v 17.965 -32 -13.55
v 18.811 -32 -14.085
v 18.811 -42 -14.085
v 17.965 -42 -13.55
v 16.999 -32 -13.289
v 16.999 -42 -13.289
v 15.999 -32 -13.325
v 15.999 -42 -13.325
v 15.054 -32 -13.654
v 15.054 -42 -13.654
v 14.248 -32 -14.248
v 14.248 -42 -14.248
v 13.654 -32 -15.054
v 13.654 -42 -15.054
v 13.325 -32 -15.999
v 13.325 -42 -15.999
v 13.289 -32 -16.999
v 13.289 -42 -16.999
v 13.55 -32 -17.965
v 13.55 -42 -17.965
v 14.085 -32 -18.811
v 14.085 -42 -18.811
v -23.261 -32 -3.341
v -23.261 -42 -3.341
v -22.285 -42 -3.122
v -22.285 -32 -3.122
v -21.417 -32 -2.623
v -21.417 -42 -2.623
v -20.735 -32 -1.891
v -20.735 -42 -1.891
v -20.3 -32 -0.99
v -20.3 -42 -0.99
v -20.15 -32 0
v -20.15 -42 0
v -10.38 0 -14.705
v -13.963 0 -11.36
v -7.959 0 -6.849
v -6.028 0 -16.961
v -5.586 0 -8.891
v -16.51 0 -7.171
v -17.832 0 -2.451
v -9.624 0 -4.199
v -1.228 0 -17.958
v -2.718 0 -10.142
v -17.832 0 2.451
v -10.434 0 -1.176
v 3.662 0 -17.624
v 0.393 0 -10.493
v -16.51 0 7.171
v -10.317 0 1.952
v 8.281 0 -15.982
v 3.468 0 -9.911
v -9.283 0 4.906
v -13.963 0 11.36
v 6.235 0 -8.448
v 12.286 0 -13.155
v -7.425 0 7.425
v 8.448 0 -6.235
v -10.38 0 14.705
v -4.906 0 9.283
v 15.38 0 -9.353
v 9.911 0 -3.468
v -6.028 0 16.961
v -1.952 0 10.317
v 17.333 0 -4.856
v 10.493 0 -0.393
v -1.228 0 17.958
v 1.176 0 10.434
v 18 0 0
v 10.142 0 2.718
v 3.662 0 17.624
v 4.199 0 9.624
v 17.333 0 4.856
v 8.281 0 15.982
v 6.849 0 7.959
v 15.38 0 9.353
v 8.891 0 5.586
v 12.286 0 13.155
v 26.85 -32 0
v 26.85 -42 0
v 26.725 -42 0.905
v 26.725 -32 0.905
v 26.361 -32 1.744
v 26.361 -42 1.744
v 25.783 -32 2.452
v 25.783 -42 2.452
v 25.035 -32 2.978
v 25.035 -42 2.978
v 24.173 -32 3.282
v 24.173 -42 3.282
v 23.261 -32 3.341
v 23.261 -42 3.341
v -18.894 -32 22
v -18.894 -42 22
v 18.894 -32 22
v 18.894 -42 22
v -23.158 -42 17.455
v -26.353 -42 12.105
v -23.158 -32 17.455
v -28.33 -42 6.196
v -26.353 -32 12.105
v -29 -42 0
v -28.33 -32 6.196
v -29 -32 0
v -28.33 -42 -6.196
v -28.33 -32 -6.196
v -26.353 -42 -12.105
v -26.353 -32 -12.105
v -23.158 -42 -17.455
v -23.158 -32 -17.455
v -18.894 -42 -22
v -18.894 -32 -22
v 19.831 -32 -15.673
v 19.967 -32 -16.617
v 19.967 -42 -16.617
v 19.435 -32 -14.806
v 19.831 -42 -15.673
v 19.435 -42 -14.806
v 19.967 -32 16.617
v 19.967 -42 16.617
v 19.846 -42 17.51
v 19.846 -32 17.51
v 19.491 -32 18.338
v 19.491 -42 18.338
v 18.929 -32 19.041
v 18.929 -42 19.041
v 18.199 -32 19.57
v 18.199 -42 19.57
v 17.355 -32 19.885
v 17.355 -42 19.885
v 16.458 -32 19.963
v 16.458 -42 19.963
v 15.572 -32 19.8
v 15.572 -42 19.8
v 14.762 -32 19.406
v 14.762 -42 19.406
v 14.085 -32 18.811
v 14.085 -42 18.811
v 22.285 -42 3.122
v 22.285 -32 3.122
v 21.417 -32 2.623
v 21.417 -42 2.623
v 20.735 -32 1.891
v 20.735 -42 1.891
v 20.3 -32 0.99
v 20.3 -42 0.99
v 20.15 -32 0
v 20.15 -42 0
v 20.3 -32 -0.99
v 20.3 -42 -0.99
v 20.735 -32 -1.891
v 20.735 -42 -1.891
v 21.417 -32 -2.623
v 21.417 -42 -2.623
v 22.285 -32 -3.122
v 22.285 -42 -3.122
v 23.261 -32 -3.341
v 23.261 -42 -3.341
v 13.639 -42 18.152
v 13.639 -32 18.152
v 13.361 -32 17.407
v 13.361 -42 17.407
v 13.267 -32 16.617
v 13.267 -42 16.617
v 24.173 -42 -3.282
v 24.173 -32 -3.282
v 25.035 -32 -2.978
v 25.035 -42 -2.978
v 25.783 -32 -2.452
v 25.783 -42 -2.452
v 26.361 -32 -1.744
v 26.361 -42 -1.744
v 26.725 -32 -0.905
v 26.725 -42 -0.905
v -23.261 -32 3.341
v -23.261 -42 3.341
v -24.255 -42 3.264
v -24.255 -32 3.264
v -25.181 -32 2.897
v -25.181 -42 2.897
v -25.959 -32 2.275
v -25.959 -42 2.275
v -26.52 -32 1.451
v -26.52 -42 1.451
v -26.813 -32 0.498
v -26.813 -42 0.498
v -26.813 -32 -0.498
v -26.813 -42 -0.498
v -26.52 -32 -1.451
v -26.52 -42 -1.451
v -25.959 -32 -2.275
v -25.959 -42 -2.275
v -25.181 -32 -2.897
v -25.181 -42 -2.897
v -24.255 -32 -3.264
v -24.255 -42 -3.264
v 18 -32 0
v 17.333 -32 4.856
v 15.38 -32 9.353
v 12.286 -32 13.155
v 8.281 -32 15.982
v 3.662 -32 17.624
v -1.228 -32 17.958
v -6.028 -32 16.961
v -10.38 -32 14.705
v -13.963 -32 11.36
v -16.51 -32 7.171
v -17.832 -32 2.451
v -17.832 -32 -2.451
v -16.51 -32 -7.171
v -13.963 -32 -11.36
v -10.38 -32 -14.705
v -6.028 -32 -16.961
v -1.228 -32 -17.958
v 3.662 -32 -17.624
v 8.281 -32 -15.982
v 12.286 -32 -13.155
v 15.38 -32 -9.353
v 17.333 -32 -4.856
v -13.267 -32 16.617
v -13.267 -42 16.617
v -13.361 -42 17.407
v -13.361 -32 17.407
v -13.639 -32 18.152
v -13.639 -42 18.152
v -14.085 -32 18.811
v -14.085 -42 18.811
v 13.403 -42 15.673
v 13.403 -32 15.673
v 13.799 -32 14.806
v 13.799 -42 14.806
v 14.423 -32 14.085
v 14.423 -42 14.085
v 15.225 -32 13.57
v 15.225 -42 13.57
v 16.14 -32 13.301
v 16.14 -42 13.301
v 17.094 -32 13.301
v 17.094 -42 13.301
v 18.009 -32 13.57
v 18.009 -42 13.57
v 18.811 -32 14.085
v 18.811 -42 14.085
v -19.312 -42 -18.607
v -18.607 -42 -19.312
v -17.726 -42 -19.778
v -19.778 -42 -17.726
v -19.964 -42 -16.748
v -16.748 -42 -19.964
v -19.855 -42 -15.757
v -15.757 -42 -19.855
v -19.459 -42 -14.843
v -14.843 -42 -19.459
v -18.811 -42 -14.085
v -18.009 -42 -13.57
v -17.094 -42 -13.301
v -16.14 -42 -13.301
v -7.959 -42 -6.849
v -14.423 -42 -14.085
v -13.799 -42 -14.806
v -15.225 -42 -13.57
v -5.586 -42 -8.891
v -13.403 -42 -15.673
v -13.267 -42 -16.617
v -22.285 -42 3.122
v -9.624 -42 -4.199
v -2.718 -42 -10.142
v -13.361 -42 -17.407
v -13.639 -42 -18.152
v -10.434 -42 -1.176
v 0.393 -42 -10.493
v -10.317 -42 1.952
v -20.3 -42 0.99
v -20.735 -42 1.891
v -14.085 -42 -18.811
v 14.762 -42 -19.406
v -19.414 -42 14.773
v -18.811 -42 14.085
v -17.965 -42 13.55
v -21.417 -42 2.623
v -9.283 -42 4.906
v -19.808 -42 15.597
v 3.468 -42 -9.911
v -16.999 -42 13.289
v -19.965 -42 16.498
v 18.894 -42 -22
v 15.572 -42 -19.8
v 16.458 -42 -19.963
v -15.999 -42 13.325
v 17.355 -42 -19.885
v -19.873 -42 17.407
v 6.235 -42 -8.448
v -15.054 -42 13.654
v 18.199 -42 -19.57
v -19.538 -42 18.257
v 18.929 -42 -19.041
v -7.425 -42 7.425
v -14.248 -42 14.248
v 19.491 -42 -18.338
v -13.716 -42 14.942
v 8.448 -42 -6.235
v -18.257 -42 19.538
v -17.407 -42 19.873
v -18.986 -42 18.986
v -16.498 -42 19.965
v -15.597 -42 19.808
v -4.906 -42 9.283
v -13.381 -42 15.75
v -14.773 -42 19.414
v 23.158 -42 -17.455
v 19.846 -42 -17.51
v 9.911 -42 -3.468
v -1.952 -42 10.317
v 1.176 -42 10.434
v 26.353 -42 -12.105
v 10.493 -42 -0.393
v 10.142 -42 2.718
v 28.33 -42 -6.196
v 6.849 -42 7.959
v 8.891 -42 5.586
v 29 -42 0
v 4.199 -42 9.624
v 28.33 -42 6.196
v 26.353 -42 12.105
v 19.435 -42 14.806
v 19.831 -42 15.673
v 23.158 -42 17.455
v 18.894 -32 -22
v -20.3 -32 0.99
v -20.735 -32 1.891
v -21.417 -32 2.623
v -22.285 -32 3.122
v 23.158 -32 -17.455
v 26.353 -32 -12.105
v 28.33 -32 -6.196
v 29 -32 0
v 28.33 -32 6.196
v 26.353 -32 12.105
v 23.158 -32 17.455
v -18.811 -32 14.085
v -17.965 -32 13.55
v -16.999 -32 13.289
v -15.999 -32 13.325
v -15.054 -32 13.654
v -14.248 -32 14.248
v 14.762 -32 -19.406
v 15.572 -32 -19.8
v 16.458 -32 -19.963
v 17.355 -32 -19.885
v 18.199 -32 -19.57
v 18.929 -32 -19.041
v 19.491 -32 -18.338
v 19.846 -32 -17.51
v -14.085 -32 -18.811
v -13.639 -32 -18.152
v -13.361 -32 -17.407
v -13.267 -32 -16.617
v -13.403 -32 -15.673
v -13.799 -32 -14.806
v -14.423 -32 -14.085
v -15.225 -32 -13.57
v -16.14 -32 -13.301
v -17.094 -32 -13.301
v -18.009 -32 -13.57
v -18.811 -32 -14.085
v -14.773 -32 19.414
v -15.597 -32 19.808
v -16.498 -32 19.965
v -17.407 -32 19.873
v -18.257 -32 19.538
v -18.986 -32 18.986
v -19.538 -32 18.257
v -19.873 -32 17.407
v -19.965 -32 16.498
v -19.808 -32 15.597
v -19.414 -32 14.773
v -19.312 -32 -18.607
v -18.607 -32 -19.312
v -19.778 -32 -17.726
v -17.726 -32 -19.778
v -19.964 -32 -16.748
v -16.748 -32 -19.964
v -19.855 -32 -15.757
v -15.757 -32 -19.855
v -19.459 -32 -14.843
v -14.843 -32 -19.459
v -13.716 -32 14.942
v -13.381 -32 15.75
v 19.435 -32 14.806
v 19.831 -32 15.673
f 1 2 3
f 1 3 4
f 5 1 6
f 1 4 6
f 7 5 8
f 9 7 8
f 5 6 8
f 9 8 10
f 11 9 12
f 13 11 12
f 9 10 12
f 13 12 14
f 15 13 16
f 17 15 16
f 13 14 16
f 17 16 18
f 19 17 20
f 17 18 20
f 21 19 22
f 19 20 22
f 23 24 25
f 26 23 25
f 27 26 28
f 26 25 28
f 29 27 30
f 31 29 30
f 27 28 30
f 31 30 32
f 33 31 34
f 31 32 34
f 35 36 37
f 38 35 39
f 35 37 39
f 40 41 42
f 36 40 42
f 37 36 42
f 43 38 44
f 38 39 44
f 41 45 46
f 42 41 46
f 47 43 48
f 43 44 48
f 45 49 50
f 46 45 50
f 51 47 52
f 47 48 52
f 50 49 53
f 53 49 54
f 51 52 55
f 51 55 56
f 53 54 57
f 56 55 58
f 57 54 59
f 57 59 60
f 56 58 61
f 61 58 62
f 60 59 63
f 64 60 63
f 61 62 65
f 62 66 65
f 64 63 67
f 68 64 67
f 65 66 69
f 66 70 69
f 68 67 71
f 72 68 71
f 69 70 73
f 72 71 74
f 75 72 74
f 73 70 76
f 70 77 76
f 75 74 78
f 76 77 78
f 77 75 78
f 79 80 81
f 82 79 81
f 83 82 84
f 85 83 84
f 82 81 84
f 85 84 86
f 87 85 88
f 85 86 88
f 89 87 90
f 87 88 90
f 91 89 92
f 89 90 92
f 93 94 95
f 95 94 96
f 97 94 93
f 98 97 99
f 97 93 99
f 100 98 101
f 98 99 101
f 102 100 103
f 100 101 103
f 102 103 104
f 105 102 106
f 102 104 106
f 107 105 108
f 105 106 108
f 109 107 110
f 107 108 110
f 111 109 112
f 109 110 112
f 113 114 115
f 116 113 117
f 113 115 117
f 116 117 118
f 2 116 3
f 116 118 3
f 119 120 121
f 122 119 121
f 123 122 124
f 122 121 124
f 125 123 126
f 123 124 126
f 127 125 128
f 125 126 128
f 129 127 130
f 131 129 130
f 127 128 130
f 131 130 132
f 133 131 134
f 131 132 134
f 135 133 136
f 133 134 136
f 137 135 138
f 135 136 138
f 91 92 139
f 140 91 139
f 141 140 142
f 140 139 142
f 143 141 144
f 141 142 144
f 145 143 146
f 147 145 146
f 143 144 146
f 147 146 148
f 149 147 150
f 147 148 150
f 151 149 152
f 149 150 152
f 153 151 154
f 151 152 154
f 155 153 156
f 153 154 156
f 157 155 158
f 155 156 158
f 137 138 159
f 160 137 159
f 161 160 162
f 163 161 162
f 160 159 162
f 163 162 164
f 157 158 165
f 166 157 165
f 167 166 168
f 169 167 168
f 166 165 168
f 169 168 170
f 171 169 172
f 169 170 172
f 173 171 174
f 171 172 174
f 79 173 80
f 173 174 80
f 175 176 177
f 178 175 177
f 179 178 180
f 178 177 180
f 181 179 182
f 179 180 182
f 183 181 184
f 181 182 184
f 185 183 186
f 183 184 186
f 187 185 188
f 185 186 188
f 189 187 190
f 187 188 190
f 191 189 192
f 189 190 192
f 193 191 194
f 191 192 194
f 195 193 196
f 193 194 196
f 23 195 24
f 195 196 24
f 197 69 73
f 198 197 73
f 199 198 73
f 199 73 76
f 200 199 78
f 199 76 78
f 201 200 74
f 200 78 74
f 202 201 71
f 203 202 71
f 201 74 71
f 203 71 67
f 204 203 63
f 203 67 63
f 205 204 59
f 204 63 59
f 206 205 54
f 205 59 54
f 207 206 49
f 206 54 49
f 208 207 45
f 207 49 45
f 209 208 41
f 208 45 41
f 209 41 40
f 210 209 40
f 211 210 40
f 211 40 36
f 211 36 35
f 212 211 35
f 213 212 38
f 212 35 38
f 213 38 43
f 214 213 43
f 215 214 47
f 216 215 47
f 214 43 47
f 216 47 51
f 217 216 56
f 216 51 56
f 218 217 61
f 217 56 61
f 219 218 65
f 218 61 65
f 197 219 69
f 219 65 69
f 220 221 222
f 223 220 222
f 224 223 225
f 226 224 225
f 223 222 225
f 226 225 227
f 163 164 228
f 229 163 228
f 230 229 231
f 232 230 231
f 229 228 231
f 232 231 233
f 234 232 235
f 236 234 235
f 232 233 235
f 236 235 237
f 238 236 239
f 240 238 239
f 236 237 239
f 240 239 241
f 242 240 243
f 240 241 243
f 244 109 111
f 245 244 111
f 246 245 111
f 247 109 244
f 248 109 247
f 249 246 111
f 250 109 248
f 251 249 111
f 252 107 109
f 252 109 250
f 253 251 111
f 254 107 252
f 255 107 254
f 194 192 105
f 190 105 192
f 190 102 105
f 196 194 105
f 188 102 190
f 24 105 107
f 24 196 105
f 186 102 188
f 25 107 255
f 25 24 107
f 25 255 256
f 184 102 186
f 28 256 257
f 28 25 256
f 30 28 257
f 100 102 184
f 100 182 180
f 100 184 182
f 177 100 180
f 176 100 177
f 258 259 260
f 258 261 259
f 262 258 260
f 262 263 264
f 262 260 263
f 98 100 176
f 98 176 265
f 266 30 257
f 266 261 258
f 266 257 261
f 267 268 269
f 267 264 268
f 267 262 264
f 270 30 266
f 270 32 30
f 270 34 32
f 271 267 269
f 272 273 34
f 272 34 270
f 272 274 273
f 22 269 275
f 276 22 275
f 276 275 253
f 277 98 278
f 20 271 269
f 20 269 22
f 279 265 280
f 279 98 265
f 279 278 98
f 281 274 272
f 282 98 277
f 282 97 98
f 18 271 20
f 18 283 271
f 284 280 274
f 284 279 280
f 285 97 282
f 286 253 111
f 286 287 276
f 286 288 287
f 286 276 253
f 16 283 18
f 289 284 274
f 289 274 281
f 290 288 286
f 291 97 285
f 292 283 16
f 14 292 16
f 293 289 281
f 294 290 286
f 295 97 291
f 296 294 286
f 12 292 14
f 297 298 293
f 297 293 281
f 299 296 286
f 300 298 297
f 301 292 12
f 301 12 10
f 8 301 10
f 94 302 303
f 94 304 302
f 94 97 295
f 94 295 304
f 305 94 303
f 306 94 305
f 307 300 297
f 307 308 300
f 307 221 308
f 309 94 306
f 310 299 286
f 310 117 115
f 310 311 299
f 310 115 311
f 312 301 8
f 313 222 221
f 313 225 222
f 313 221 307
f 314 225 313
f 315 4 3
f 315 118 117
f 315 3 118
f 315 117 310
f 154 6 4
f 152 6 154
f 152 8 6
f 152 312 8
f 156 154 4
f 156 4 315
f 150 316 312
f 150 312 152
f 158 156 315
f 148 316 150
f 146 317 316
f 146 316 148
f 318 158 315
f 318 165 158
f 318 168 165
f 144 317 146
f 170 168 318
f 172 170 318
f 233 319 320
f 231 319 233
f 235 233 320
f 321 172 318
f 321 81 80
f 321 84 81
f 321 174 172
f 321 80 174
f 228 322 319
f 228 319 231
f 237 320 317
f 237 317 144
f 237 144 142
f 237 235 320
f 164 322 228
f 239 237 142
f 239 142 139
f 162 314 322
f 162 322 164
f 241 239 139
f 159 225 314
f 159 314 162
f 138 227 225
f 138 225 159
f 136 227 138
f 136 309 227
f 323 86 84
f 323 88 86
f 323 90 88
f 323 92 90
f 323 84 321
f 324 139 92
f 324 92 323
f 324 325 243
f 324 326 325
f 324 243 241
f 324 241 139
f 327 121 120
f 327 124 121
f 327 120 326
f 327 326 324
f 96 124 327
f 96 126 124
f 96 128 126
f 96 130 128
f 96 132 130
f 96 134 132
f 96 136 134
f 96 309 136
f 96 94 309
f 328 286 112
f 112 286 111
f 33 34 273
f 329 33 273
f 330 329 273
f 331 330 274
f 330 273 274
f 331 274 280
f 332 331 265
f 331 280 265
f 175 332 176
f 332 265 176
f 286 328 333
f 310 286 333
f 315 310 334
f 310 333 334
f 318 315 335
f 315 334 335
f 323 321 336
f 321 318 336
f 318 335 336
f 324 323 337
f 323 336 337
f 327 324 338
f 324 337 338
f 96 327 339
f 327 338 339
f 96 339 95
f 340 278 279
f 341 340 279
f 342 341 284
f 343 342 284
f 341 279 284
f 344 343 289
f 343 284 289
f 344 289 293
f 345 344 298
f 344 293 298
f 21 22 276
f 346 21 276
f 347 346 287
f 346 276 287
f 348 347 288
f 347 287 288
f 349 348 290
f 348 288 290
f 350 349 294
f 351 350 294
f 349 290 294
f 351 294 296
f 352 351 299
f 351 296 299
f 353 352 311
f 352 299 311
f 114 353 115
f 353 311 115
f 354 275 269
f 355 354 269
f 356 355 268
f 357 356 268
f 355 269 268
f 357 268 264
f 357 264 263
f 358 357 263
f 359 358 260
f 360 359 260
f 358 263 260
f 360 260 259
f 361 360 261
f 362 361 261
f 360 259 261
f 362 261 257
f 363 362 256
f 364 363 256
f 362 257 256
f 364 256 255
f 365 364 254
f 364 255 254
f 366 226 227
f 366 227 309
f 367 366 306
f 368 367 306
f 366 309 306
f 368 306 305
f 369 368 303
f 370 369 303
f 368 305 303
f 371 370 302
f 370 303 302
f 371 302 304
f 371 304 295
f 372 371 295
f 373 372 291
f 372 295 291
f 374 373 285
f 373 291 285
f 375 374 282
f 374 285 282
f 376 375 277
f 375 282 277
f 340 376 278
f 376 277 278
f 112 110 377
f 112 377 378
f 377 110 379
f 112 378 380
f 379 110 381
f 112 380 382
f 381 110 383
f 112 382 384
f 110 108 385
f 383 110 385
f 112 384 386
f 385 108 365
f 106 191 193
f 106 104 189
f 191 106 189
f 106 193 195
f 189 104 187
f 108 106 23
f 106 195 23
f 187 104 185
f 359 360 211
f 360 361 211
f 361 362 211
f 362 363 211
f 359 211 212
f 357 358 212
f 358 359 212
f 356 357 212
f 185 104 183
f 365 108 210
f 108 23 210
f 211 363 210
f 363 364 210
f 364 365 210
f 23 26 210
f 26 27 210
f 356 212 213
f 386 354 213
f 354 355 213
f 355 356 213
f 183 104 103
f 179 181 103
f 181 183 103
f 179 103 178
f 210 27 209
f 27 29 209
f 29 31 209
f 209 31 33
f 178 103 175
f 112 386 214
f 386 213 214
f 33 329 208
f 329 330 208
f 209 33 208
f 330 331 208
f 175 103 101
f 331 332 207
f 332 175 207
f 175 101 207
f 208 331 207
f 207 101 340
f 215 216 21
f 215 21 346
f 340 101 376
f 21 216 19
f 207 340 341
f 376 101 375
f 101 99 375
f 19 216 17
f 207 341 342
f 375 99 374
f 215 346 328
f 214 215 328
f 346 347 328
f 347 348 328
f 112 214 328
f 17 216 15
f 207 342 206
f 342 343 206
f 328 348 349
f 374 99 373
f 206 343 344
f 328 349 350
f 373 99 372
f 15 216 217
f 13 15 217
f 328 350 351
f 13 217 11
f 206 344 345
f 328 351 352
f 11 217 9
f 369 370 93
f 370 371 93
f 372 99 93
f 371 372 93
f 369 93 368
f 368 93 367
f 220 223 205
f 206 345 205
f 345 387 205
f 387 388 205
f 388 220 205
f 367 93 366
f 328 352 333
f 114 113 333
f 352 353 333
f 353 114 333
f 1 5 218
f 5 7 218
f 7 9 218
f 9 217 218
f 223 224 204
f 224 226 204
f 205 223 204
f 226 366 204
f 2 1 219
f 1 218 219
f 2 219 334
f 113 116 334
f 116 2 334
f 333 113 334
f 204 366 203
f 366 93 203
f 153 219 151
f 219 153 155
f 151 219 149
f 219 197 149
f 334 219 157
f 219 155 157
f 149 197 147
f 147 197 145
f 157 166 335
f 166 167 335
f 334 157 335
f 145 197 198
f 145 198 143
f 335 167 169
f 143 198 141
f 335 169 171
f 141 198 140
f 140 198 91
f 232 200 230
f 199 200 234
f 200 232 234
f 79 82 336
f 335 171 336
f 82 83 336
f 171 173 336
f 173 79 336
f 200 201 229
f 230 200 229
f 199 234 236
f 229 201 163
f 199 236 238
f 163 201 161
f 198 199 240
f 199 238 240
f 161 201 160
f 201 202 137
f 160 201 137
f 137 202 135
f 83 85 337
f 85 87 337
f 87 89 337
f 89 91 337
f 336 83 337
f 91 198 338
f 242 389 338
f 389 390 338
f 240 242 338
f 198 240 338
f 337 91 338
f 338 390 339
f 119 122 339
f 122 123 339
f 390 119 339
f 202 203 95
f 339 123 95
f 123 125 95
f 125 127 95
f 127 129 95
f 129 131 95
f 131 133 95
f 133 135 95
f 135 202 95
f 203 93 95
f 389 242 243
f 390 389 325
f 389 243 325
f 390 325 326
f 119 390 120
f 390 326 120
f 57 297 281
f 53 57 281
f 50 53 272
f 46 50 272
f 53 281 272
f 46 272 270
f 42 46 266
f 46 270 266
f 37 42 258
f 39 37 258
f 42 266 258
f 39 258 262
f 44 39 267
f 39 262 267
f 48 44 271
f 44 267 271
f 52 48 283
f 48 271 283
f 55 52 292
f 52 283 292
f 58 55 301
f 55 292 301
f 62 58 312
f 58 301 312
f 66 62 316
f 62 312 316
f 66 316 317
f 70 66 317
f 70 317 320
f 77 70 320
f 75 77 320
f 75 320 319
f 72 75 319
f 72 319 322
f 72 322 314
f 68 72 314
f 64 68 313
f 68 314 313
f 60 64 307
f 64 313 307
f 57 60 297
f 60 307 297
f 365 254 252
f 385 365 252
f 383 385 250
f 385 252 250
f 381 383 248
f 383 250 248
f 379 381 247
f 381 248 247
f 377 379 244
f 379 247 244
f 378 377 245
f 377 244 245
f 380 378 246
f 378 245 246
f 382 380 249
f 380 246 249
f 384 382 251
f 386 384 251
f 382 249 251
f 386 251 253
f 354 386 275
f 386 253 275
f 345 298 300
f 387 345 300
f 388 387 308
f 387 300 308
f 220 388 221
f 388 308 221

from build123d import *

# Parameters (mm, degrees)
F0_R     = 18
F1_DEPTH = 32
F2_R     = 29
F3_DEPTH = 10
F5_DEPTH = 42


with BuildPart() as f1:
    # F0 (on Front) → F1 (new body)
    with BuildSketch(Plane.XZ):
        Circle(F0_R)
    extrude(amount=F1_DEPTH)

    # F2 (on face) → F3 (join)
    with BuildSketch(Plane.XZ.offset(32)):
        Circle(F2_R)
    extrude(amount=F3_DEPTH)

    # F4 (on face) → F5 (cut)
    with BuildSketch(Plane.XZ.offset(42)):
        with BuildLine():
            Line((0, 0), (-7.4246212025, 7.4246212025))
            ThreePointArc((-7.4246212025, 7.4246212025), (-9.7007350914, 4.0181760398), (-10.5, 0))
            Line((-10.5, 0), (0, 0))
        make_face()
        with BuildLine():
            ThreePointArc((-10.5, 0), (0, -10.5), (10.5, 0))
            ThreePointArc((10.5, 0), (4.0181760398, 9.7007350914), (-7.4246212025, 7.4246212025))
            Line((-7.4246212025, 7.4246212025), (0, 0))
            Line((0, 0), (-10.5, 0))
        make_face()
        with BuildLine():
            Line((-16.6170093579, 16.6170093579), (-14.2482016409, 14.2482016409))
            ThreePointArc((-14.2482016409, 14.2482016409), (-13.522012924, 15.3350198595), (-13.2670093579, 16.6170093579))
            Line((-13.2670093579, 16.6170093579), (-16.6170093579, 16.6170093579))
        make_face()
        with BuildLine():
            ThreePointArc((-18.8109516732, 14.0853859425), (-16.4975450742, 13.2691401423), (-14.2482016409, 14.2482016409))
            Line((-14.2482016409, 14.2482016409), (-16.6170093579, 16.6170093579))
            ThreePointArc((-16.6170093579, 16.6170093579), (-17.7591493316, 15.3903416147), (-18.8109516732, 14.0853859425))
        make_face()
        with BuildLine():
            ThreePointArc((-18.9858170749, 18.9858170749), (-19.9648785735, 16.4975450742), (-18.8109516732, 14.0853859425))
            ThreePointArc((-18.8109516732, 14.0853859425), (-17.7591493316, 15.3903416147), (-16.6170093579, 16.6170093579))
            Line((-16.6170093579, 16.6170093579), (-18.9858170749, 18.9858170749))
        make_face()
        with BuildLine():
            Line((-18.9858170749, 18.9858170749), (-16.6170093579, 16.6170093579))
            ThreePointArc((-16.6170093579, 16.6170093579), (-15.3903416147, 17.7591493316), (-14.0853859425, 18.8109516732))
            ThreePointArc((-14.0853859425, 18.8109516732), (-16.4975450742, 19.9648785735), (-18.9858170749, 18.9858170749))
        make_face()
        with BuildLine():
            ThreePointArc((-23.5, 0), (-23.440229841, 1.675), (-23.2612234043, 3.3414795731))
            ThreePointArc((-23.2612234043, 3.3414795731), (-26.85, 0), (-23.2612234043, -3.3414795731))
            ThreePointArc((-23.2612234043, -3.3414795731), (-23.440229841, -1.675), (-23.5, 0))
        make_face()
        with BuildLine():
            Line((-23.5, 0), (-20.15, 0))
            ThreePointArc((-20.15, 0), (-21.04822497, 2.2828270198), (-23.2612234043, 3.3414795731))
            ThreePointArc((-23.2612234043, 3.3414795731), (-23.440229841, 1.675), (-23.5, 0))
        make_face()
        with BuildLine():
            ThreePointArc((-23.2612234043, -3.3414795731), (-21.04822497, -2.2828270198), (-20.15, 0))
            Line((-20.15, 0), (-23.5, 0))
            ThreePointArc((-23.5, 0), (-23.440229841, -1.675), (-23.2612234043, -3.3414795731))
        make_face()
        with BuildLine():
            ThreePointArc((-14.0853859425, -18.8109516732), (-16.6170093579, -16.6170093579), (-18.8109516732, -14.0853859425))
            ThreePointArc((-18.8109516732, -14.0853859425), (-18.9858170749, -18.9858170749), (-14.0853859425, -18.8109516732))
        make_face()
        with BuildLine():
            ThreePointArc((-13.2670093579, -16.6170093579), (-15.2254646687, -13.5696985142), (-18.8109516732, -14.0853859425))
            ThreePointArc((-18.8109516732, -14.0853859425), (-16.6170093579, -16.6170093579), (-14.0853859425, -18.8109516732))
            ThreePointArc((-14.0853859425, -18.8109516732), (-13.4782645099, -17.7878128338), (-13.2670093579, -16.6170093579))
        make_face()
        with BuildLine():
            ThreePointArc((14.0853859425, -18.8109516732), (16.6170093579, -16.6170093579), (18.8109516732, -14.0853859425))
            ThreePointArc((18.8109516732, -14.0853859425), (14.2482016409, -14.2482016409), (14.0853859425, -18.8109516732))
        make_face()
        with BuildLine():
            ThreePointArc((19.9670093579, -16.6170093579), (19.6643202016, -15.2254646687), (18.8109516732, -14.0853859425))
            ThreePointArc((18.8109516732, -14.0853859425), (16.6170093579, -16.6170093579), (14.0853859425, -18.8109516732))
            ThreePointArc((14.0853859425, -18.8109516732), (17.7878128338, -19.7557542059), (19.9670093579, -16.6170093579))
        make_face()
        with BuildLine():
            ThreePointArc((23.5, 0), (23.440229841, 1.675), (23.2612234043, 3.3414795731))
            ThreePointArc((23.2612234043, 3.3414795731), (20.15, 0), (23.2612234043, -3.3414795731))
            ThreePointArc((23.2612234043, -3.3414795731), (23.440229841, -1.675), (23.5, 0))
        make_face()
        with BuildLine():
            ThreePointArc((26.85, 0), (25.7828270198, 2.45177503), (23.2612234043, 3.3414795731))
            ThreePointArc((23.2612234043, 3.3414795731), (23.440229841, 1.675), (23.5, 0))
            ThreePointArc((23.5, 0), (23.440229841, -1.675), (23.2612234043, -3.3414795731))
            ThreePointArc((23.2612234043, -3.3414795731), (25.7828270198, -2.45177503), (26.85, 0))
        make_face()
        with BuildLine():
            ThreePointArc((19.9670093579, 16.6170093579), (17.7878128338, 19.7557542059), (14.0853859425, 18.8109516732))
            ThreePointArc((14.0853859425, 18.8109516732), (15.3903416147, 17.7591493316), (16.6170093579, 16.6170093579))
            Line((16.6170093579, 16.6170093579), (19.9670093579, 16.6170093579))
        make_face()
        with BuildLine():
            ThreePointArc((16.6170093579, 16.6170093579), (17.7591493316, 15.3903416147), (18.8109516732, 14.0853859425))
            ThreePointArc((18.8109516732, 14.0853859425), (19.6643202016, 15.2254646687), (19.9670093579, 16.6170093579))
            Line((19.9670093579, 16.6170093579), (16.6170093579, 16.6170093579))
        make_face()
        with BuildLine():
            Line((16.6170093579, 16.6170093579), (13.2670093579, 16.6170093579))
            ThreePointArc((13.2670093579, 16.6170093579), (15.2254646687, 13.5696985142), (18.8109516732, 14.0853859425))
            ThreePointArc((18.8109516732, 14.0853859425), (17.7591493316, 15.3903416147), (16.6170093579, 16.6170093579))
        make_face()
        with BuildLine():
            ThreePointArc((14.0853859425, 18.8109516732), (13.4782645099, 17.7878128338), (13.2670093579, 16.6170093579))
            Line((13.2670093579, 16.6170093579), (16.6170093579, 16.6170093579))
            ThreePointArc((16.6170093579, 16.6170093579), (15.3903416147, 17.7591493316), (14.0853859425, 18.8109516732))
        make_face()
        with BuildLine():
            Line((-18.8944436277, 22), (-8.2613558209, 22))
            ThreePointArc((-8.2613558209, 22), (0, 23.5), (8.2613558209, 22))
            Line((8.2613558209, 22), (18.8944436277, 22))
            ThreePointArc((18.8944436277, 22), (0, 29), (-18.8944436277, 22))
        make_face()
        with BuildLine():
            ThreePointArc((8.2613558209, 22), (0, 23.5), (-8.2613558209, 22))
            Line((-8.2613558209, 22), (8.2613558209, 22))
        make_face()
        with BuildLine():
            Line((-8.2613558209, -22), (-18.8944436277, -22))
            ThreePointArc((-18.8944436277, -22), (0, -29), (18.8944436277, -22))
            Line((18.8944436277, -22), (8.2613558209, -22))
            ThreePointArc((8.2613558209, -22), (0, -23.5), (-8.2613558209, -22))
        make_face()
        with BuildLine():
            Line((8.2613558209, -22), (-8.2613558209, -22))
            ThreePointArc((-8.2613558209, -22), (0, -23.5), (8.2613558209, -22))
        make_face()
        with BuildLine():
            Line((-16.6170093579, 16.6170093579), (-13.2670093579, 16.6170093579))
            ThreePointArc((-13.2670093579, 16.6170093579), (-13.4782645099, 17.7878128338), (-14.0853859425, 18.8109516732))
            ThreePointArc((-14.0853859425, 18.8109516732), (-15.3903416147, 17.7591493316), (-16.6170093579, 16.6170093579))
        make_face()
    extrude(amount=-F5_DEPTH, mode=Mode.SUBTRACT)


solid = f1.part
